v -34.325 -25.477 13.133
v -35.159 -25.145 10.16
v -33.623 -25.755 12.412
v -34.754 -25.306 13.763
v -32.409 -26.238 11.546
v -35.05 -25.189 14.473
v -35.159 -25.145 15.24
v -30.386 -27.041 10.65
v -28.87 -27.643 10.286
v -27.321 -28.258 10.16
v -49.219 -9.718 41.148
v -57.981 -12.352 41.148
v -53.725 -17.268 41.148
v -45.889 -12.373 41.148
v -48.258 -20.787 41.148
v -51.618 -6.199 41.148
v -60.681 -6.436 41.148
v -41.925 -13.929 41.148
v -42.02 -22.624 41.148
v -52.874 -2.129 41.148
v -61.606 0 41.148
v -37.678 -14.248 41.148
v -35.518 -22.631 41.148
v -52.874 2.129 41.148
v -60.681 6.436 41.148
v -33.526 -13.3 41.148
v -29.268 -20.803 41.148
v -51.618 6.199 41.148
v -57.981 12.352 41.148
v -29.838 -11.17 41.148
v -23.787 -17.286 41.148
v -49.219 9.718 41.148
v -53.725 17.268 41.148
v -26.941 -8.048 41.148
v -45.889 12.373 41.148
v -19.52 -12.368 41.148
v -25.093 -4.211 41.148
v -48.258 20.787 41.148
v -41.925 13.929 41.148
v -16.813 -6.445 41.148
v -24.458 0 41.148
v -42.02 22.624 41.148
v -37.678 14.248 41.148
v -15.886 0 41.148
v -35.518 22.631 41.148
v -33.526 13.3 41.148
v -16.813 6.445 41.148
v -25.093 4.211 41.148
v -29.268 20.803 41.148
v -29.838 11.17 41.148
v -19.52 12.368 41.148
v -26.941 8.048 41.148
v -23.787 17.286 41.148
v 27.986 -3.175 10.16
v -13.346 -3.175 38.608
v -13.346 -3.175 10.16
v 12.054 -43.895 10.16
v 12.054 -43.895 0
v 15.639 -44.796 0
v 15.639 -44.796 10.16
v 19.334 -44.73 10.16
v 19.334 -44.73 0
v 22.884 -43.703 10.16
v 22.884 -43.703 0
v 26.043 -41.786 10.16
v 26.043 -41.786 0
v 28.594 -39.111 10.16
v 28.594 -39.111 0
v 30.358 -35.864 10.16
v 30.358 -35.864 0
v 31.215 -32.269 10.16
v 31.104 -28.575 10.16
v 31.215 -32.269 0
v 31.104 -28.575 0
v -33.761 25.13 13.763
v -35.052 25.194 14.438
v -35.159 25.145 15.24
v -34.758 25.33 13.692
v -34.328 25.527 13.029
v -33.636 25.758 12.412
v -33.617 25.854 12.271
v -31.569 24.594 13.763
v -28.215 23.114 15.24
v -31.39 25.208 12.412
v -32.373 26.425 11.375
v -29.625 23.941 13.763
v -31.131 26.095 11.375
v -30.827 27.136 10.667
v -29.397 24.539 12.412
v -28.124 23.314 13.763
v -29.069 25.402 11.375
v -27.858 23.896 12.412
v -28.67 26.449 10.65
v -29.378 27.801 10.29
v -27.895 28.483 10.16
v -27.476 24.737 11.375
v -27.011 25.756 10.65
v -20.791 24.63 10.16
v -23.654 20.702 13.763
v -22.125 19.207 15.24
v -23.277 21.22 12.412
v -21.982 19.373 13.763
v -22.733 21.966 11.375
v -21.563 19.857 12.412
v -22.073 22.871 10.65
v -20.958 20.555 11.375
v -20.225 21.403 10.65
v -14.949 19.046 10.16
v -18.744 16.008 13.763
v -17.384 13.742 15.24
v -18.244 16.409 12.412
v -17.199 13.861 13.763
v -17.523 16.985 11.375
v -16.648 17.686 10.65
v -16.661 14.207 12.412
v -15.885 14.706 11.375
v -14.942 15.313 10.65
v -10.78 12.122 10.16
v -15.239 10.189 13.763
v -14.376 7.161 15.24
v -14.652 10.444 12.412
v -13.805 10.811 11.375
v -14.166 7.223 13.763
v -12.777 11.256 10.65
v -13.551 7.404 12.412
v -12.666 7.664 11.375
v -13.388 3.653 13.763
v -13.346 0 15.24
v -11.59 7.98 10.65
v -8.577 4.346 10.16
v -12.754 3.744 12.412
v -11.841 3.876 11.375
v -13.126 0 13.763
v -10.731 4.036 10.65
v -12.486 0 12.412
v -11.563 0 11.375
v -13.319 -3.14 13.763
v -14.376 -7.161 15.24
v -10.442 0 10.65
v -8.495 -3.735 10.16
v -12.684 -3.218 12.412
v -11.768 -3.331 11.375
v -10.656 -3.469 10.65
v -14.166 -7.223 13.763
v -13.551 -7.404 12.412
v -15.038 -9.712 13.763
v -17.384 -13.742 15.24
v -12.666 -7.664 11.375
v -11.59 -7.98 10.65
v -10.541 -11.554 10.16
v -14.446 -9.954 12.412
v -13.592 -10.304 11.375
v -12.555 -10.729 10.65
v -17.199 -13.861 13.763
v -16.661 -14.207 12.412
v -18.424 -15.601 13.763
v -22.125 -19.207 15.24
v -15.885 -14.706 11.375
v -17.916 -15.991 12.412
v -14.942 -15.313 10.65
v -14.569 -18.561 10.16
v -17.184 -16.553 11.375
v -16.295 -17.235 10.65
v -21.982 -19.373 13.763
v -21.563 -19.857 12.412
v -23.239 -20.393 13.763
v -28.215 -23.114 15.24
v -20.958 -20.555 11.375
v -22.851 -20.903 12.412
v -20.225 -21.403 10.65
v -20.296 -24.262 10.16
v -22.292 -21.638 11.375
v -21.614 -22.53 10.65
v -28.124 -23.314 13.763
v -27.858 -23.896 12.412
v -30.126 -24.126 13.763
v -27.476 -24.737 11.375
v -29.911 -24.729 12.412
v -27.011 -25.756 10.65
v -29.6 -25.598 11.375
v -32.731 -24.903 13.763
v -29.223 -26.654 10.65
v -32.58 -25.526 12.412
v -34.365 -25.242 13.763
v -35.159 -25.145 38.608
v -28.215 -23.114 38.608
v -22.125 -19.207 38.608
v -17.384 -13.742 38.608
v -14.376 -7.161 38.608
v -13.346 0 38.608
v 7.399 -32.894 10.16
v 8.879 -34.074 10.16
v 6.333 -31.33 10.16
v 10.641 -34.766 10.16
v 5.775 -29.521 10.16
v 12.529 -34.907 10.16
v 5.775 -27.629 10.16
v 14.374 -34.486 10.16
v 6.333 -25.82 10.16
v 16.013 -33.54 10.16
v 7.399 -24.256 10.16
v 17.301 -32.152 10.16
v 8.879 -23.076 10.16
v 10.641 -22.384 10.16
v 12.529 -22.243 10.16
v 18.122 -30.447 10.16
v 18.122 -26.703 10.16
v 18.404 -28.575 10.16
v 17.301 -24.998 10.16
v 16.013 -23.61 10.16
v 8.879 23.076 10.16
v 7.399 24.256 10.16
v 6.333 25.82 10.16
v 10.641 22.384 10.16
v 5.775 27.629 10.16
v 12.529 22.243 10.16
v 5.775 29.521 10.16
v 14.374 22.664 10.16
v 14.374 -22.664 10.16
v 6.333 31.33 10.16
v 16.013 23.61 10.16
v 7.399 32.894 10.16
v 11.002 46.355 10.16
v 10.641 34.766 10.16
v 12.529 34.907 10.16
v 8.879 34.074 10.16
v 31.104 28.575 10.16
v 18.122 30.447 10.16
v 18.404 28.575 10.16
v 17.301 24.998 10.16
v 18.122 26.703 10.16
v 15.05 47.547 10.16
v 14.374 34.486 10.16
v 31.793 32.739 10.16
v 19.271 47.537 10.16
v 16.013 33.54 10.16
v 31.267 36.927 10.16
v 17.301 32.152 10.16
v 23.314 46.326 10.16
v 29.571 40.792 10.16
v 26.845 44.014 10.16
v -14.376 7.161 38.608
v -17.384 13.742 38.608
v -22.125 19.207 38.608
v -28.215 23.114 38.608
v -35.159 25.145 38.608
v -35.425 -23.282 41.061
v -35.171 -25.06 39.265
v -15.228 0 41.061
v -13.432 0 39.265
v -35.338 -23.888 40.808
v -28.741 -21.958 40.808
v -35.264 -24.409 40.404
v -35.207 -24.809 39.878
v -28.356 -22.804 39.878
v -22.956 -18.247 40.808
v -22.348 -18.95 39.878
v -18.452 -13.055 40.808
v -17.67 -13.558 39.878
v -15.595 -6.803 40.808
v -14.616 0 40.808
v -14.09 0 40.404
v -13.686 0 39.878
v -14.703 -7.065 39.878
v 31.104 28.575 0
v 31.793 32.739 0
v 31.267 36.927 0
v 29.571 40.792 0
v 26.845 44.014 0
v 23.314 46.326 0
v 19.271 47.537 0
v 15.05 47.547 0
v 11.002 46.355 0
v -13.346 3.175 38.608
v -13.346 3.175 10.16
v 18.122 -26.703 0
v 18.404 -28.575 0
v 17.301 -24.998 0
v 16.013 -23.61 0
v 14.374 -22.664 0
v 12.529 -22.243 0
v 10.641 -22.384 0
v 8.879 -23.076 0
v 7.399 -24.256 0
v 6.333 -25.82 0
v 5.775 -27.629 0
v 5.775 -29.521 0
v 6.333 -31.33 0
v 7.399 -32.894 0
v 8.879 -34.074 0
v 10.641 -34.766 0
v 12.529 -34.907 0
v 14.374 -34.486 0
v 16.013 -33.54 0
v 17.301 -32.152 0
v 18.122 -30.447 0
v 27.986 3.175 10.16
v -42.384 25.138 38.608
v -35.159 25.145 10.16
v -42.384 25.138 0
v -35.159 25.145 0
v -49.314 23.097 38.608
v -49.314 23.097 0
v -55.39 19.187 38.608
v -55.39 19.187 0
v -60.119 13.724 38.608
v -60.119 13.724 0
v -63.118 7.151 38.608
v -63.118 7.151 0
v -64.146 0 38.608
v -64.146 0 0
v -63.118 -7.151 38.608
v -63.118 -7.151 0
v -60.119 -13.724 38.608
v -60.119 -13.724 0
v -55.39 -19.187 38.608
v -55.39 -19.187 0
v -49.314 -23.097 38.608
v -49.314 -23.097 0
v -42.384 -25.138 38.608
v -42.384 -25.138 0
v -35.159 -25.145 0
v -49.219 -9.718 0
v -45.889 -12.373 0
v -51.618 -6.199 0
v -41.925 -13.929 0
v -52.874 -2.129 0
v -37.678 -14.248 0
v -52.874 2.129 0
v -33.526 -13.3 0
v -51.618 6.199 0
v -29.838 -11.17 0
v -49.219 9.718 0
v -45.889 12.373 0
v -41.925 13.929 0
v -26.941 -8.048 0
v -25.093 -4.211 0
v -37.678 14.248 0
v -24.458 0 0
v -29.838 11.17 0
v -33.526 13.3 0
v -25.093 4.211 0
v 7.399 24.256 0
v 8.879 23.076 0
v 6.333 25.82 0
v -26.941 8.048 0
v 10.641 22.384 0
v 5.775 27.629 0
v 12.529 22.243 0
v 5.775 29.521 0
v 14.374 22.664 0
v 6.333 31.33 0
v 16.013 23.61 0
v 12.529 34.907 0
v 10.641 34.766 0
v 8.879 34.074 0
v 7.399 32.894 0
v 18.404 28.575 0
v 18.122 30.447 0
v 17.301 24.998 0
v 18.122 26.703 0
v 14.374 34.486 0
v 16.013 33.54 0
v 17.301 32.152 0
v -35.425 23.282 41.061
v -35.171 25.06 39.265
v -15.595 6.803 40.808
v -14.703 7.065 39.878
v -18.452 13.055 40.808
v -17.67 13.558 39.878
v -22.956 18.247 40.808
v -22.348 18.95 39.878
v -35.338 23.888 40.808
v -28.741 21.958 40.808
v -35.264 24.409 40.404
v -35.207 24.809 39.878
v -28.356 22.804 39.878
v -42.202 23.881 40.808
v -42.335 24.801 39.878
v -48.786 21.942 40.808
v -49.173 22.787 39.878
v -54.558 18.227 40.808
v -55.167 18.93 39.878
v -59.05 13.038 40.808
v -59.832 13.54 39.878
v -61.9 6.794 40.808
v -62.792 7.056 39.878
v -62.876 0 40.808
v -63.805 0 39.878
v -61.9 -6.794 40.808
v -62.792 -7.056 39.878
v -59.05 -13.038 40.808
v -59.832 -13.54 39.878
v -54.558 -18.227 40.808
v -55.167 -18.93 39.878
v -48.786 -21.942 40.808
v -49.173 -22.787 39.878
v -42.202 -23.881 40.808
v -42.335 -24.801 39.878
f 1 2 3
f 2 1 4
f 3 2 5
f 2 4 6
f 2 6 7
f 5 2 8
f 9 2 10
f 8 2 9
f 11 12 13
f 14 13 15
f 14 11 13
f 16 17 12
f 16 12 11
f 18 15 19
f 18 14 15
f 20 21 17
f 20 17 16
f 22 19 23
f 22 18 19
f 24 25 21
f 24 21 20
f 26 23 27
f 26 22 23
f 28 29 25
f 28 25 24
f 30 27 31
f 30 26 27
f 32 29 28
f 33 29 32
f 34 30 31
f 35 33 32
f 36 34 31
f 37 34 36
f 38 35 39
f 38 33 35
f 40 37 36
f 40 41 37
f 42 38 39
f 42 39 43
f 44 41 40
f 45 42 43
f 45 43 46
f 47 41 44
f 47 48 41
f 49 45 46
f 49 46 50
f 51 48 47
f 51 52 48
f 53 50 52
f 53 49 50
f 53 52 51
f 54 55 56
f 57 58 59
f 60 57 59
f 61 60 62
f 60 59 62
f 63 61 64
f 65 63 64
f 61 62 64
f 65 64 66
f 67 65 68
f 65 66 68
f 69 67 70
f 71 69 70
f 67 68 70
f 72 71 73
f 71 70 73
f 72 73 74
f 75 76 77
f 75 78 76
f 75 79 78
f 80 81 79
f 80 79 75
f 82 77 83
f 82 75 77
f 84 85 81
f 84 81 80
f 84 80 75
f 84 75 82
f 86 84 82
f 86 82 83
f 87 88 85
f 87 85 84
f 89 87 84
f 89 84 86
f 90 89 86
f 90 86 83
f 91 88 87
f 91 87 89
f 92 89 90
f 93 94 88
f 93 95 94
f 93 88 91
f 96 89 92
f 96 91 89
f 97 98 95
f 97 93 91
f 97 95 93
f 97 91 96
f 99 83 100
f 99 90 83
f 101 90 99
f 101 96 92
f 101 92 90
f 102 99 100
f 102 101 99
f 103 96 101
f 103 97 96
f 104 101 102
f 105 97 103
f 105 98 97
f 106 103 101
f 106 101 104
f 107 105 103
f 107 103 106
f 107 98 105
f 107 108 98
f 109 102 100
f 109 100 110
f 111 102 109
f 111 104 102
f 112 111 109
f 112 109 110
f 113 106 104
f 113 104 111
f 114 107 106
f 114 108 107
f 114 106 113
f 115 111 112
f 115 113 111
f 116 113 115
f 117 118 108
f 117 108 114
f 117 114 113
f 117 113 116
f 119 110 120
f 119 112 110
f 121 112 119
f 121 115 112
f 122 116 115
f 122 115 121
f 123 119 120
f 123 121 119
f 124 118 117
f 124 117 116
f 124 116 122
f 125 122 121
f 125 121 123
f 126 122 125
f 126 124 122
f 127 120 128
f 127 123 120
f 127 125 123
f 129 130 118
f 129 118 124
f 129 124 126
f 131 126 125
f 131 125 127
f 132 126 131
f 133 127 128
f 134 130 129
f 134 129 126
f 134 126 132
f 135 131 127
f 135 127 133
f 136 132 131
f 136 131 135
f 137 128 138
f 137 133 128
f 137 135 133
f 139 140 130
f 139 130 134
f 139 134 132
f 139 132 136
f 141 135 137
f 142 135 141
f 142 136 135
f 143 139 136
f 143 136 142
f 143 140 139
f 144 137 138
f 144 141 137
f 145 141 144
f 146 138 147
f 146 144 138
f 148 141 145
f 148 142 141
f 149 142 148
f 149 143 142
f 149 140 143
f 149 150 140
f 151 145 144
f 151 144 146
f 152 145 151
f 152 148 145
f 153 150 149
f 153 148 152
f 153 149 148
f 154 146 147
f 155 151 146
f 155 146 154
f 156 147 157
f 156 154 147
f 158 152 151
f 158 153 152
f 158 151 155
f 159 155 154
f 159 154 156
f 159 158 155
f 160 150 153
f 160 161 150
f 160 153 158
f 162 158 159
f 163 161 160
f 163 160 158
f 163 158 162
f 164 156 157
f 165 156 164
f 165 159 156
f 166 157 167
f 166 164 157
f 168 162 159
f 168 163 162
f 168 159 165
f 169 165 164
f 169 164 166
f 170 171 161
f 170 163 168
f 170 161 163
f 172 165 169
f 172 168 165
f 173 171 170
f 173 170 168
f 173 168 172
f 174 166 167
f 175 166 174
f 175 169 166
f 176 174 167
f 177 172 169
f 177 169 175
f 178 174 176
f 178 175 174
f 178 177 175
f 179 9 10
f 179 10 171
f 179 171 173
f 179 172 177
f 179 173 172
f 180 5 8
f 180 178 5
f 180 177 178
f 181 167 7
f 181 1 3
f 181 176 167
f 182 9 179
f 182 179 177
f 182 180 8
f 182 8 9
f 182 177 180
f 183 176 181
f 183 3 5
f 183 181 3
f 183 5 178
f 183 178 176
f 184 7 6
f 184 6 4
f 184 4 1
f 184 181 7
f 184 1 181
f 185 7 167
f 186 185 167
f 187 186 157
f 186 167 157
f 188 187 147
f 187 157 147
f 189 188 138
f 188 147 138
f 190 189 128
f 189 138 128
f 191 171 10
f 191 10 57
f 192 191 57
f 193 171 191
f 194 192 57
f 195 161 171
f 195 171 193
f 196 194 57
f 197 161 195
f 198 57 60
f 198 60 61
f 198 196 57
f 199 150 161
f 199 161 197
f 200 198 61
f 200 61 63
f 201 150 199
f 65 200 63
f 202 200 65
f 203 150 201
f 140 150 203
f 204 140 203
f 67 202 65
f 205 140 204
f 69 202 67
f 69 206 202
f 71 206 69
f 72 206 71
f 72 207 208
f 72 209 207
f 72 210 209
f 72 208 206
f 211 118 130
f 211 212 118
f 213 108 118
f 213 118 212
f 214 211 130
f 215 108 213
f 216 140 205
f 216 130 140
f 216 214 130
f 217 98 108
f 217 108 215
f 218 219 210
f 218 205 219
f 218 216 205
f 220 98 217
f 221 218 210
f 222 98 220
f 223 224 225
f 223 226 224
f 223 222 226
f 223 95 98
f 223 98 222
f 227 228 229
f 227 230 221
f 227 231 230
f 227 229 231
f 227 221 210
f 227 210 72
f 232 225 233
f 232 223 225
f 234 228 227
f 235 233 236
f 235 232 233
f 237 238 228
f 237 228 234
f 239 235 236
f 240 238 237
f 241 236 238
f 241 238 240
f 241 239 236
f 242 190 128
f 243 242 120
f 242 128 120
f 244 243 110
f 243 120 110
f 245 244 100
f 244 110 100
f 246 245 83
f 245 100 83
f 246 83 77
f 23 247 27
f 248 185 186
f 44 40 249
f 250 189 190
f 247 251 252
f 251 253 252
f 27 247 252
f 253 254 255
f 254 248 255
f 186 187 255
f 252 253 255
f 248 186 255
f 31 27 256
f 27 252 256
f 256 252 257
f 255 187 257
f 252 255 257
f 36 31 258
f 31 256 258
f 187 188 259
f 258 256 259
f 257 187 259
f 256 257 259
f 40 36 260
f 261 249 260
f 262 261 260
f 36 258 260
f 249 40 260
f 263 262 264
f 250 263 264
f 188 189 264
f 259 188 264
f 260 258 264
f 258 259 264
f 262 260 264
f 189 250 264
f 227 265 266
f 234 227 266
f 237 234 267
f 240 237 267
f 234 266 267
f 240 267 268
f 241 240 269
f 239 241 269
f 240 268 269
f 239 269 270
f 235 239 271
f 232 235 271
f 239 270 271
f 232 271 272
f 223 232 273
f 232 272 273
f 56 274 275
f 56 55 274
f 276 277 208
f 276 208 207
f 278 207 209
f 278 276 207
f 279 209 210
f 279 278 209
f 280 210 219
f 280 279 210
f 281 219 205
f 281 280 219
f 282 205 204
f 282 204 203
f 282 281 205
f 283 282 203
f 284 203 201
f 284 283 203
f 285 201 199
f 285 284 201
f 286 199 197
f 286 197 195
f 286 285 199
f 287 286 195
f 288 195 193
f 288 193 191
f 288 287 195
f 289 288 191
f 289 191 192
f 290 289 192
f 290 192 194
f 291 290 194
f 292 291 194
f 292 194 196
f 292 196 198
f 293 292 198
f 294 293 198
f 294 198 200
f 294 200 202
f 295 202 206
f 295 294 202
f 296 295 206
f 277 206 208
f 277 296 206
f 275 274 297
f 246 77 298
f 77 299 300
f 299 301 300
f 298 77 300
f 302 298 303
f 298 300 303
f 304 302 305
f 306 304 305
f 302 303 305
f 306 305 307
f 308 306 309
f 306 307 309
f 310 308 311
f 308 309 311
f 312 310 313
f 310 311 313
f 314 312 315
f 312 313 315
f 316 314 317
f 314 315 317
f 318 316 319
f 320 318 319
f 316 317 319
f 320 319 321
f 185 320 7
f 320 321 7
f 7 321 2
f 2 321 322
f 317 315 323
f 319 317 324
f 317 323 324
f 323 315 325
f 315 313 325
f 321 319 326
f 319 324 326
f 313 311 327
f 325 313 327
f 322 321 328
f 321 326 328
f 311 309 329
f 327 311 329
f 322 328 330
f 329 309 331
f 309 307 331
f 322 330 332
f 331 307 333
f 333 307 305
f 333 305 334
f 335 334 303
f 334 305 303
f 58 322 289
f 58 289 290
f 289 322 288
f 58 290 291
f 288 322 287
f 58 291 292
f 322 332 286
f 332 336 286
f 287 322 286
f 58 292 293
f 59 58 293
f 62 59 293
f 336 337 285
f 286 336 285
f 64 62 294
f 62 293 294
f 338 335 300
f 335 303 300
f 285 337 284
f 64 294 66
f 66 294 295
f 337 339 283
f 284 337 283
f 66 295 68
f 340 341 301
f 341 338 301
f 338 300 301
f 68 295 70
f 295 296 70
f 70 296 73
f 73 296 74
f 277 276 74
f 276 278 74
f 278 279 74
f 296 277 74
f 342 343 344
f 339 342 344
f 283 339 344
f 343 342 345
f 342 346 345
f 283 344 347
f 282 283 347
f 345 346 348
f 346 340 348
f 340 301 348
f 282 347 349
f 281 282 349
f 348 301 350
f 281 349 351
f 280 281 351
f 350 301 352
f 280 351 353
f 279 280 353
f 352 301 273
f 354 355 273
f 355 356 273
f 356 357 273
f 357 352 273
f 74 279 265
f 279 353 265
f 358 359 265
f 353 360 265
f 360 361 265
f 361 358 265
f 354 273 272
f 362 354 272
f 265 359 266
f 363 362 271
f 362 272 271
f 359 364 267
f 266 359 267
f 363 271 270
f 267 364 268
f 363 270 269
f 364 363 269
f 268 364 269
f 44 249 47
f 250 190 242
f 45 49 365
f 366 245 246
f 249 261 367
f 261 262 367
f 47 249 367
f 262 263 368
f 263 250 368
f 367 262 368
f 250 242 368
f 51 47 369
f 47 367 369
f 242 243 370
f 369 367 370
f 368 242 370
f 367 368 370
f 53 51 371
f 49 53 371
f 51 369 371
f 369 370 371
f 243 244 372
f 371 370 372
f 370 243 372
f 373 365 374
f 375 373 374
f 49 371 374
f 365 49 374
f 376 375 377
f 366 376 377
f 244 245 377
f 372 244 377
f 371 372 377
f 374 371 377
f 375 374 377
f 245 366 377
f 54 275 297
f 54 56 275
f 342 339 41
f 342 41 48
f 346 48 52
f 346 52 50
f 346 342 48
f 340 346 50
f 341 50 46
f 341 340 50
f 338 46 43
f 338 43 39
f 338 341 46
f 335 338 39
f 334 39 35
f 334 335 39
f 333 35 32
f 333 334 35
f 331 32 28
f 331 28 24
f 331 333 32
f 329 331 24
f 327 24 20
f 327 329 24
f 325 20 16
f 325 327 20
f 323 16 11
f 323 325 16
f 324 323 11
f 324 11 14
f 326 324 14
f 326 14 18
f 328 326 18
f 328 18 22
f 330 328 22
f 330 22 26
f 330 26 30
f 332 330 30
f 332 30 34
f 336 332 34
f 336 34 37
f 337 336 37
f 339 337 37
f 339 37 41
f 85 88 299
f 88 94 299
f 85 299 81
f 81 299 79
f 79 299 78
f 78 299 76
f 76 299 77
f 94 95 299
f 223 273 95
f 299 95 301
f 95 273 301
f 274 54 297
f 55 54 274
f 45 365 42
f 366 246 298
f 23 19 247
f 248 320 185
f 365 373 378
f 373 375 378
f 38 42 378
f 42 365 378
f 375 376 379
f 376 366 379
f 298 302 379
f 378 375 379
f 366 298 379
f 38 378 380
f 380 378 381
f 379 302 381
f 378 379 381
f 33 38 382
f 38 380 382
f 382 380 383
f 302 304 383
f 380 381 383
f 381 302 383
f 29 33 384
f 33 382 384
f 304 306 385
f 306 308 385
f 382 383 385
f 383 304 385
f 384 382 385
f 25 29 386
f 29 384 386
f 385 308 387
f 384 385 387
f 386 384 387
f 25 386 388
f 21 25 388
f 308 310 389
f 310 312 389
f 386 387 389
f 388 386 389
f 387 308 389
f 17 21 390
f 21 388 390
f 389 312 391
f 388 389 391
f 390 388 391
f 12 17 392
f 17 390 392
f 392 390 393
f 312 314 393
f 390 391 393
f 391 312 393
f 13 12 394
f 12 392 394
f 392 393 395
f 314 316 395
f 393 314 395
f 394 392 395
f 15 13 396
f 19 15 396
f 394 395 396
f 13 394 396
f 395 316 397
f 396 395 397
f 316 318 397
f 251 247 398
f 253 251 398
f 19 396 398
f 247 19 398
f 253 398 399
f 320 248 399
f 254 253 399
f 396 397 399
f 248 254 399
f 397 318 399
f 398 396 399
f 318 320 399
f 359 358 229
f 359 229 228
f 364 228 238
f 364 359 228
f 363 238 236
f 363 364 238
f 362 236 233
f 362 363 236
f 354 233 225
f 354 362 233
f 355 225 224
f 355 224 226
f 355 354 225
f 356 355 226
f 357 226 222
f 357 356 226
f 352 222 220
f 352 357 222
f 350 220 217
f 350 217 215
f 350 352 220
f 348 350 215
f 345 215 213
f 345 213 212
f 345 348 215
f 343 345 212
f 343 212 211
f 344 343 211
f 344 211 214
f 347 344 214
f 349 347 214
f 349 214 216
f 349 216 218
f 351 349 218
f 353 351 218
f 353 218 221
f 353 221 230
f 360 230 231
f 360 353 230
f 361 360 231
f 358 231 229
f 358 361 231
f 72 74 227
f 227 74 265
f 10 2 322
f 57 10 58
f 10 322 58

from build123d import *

# Parameters (mm, degrees)
F0_R          = 14.2875
F2_DEPTH      = 41.148
F0_R_2        = 6.35
F3_DEPTH      = 10.16
F4_R          = 2.54
F6_DEPTH      = 3.175
F6_DEPTH_BACK = 3.175
F7_T4_ANGLE   = 221.1362500102


# Not quite as in the source:
# - a fillet or chamfer that OpenCascade refuses, or shapes differently, is made with other operations: its cross-section is extruded or revolved along the edge and cut away or added


with BuildPart() as f2:
    # F0 (on Top) → F2 (new body)
    with BuildSketch(Plane.XY):
        with BuildLine():
            ThreePointArc((-35.158992291, -25.1454820671), (-19.5589790857, -16.6441687329), (-13.3457361643, 0))
            ThreePointArc((-13.3457361643, 0), (-19.5589790857, 16.6441687329), (-35.158992291, 25.1454820671))
            ThreePointArc((-35.158992291, 25.1454820671), (-64.1457361643, 0), (-35.158992291, -25.1454820671))
        make_face()
        with Locations((-38.7457361643, 0)):
            Circle(F0_R, mode=Mode.SUBTRACT)
    extrude(amount=F2_DEPTH)

    # F0 (on Top) → F3 (join)
    with BuildSketch(Plane.XY):
        with BuildLine():
            ThreePointArc((-35.158992291, -25.1454820671), (-19.5589790857, -16.6441687329), (-13.3457361643, 0))
            ThreePointArc((-13.3457361643, 0), (-19.5589790857, 16.6441687329), (-35.158992291, 25.1454820671))
            ThreePointArc((-35.158992291, 25.1454820671), (-64.1457361643, 0), (-35.158992291, -25.1454820671))
        make_face()
        with Locations((-38.7457361643, 0)):
            Circle(F0_R, mode=Mode.SUBTRACT)
        with BuildLine():
            ThreePointArc((-35.158992291, 25.1454820671), (-19.5589790857, 16.6441687329), (-13.3457361643, 0))
            ThreePointArc((-13.3457361643, 0), (-19.5589790857, -16.6441687329), (-35.158992291, -25.1454820671))
            Line((-35.158992291, -25.1454820671), (12.0542638357, -43.8951072877))
            ThreePointArc((12.0542638357, -43.8951072877), (26.0434071743, -41.786054626), (31.1042638357, -28.575))
            Line((31.1042638357, -28.575), (31.1042638357, 28.575))
            ThreePointArc((31.1042638357, 28.575), (26.8447918404, 44.0135088699), (11.0015574139, 46.355))
            Line((11.0015574139, 46.355), (-35.158992291, 25.1454820671))
        make_face()
        with Locations((12.0542638357, -28.575)):
            Circle(F0_R_2, mode=Mode.SUBTRACT)
        with Locations((12.0542638357, 28.575)):
            Circle(F0_R_2, mode=Mode.SUBTRACT)
    extrude(amount=F3_DEPTH)

    # F4
    f4_edges = [f2.edges().sort_by_distance(p)[0] for p in [
        (-42.33248, 25.145482, 41.148),
    ]]
    fillet(f4_edges, radius=F4_R)

    # F7: fillet of radius 5.08 on 1 edges, made by hand


with BuildPart() as f6:
    # F5 (on Front) → F6 (new body, two sides)
    with BuildSketch(Plane.XZ) as f6_sk:
        Polygon((-13.3457361643, 10.16), (11.0015574139, 10.16), (12.0542638357, 10.16), (27.9858194052, 10.16), (-13.3457361643, 38.608), align=None)
    extrude(amount=F6_DEPTH)
    extrude(f6_sk.sketch, amount=-F6_DEPTH_BACK)


with BuildPart() as f7_tool2:
    # F7_s3 → F7_t4 (revolve)
    with BuildSketch(Plane(origin=(-33.9634919914, -12.7444776929, 0), x_dir=(0, 0, 1), z_dir=(-0.9362551287, -0.351320842, 0))):
        with BuildLine():
            ThreePointArc((15.24, 39.0121846518), (11.6478975516, 40.5000822033), (10.16, 44.0921846518))
            Line((10.16, 44.0921846518), (10.16, 39.0121846518))
            Line((10.16, 39.0121846518), (15.24, 39.0121846518))
        make_face()
    revolve(axis=Axis((-38.7457361643, 0, 10.16), (0, 0, -1)), revolution_arc=F7_T4_ANGLE)

    split(bisect_by=Plane(origin=(-15.6684224941, 34.1008691297, 0), x_dir=(0, 0, 1), z_dir=(0.4175101955, -0.9086722383, 0)), keep=Keep.TOP)

    split(bisect_by=Plane(origin=(-13.4151395624, -33.7805376205, 0), x_dir=(0, 0, 1), z_dir=(0.3690871106, 0.9293948056, 0)), keep=Keep.TOP)


with BuildPart() as f2_1:
    add(f2.part)

    # F7_t1: union F7_tool2
    add(f7_tool2.part)


solid = Compound([f6.part, f2_1.part])
